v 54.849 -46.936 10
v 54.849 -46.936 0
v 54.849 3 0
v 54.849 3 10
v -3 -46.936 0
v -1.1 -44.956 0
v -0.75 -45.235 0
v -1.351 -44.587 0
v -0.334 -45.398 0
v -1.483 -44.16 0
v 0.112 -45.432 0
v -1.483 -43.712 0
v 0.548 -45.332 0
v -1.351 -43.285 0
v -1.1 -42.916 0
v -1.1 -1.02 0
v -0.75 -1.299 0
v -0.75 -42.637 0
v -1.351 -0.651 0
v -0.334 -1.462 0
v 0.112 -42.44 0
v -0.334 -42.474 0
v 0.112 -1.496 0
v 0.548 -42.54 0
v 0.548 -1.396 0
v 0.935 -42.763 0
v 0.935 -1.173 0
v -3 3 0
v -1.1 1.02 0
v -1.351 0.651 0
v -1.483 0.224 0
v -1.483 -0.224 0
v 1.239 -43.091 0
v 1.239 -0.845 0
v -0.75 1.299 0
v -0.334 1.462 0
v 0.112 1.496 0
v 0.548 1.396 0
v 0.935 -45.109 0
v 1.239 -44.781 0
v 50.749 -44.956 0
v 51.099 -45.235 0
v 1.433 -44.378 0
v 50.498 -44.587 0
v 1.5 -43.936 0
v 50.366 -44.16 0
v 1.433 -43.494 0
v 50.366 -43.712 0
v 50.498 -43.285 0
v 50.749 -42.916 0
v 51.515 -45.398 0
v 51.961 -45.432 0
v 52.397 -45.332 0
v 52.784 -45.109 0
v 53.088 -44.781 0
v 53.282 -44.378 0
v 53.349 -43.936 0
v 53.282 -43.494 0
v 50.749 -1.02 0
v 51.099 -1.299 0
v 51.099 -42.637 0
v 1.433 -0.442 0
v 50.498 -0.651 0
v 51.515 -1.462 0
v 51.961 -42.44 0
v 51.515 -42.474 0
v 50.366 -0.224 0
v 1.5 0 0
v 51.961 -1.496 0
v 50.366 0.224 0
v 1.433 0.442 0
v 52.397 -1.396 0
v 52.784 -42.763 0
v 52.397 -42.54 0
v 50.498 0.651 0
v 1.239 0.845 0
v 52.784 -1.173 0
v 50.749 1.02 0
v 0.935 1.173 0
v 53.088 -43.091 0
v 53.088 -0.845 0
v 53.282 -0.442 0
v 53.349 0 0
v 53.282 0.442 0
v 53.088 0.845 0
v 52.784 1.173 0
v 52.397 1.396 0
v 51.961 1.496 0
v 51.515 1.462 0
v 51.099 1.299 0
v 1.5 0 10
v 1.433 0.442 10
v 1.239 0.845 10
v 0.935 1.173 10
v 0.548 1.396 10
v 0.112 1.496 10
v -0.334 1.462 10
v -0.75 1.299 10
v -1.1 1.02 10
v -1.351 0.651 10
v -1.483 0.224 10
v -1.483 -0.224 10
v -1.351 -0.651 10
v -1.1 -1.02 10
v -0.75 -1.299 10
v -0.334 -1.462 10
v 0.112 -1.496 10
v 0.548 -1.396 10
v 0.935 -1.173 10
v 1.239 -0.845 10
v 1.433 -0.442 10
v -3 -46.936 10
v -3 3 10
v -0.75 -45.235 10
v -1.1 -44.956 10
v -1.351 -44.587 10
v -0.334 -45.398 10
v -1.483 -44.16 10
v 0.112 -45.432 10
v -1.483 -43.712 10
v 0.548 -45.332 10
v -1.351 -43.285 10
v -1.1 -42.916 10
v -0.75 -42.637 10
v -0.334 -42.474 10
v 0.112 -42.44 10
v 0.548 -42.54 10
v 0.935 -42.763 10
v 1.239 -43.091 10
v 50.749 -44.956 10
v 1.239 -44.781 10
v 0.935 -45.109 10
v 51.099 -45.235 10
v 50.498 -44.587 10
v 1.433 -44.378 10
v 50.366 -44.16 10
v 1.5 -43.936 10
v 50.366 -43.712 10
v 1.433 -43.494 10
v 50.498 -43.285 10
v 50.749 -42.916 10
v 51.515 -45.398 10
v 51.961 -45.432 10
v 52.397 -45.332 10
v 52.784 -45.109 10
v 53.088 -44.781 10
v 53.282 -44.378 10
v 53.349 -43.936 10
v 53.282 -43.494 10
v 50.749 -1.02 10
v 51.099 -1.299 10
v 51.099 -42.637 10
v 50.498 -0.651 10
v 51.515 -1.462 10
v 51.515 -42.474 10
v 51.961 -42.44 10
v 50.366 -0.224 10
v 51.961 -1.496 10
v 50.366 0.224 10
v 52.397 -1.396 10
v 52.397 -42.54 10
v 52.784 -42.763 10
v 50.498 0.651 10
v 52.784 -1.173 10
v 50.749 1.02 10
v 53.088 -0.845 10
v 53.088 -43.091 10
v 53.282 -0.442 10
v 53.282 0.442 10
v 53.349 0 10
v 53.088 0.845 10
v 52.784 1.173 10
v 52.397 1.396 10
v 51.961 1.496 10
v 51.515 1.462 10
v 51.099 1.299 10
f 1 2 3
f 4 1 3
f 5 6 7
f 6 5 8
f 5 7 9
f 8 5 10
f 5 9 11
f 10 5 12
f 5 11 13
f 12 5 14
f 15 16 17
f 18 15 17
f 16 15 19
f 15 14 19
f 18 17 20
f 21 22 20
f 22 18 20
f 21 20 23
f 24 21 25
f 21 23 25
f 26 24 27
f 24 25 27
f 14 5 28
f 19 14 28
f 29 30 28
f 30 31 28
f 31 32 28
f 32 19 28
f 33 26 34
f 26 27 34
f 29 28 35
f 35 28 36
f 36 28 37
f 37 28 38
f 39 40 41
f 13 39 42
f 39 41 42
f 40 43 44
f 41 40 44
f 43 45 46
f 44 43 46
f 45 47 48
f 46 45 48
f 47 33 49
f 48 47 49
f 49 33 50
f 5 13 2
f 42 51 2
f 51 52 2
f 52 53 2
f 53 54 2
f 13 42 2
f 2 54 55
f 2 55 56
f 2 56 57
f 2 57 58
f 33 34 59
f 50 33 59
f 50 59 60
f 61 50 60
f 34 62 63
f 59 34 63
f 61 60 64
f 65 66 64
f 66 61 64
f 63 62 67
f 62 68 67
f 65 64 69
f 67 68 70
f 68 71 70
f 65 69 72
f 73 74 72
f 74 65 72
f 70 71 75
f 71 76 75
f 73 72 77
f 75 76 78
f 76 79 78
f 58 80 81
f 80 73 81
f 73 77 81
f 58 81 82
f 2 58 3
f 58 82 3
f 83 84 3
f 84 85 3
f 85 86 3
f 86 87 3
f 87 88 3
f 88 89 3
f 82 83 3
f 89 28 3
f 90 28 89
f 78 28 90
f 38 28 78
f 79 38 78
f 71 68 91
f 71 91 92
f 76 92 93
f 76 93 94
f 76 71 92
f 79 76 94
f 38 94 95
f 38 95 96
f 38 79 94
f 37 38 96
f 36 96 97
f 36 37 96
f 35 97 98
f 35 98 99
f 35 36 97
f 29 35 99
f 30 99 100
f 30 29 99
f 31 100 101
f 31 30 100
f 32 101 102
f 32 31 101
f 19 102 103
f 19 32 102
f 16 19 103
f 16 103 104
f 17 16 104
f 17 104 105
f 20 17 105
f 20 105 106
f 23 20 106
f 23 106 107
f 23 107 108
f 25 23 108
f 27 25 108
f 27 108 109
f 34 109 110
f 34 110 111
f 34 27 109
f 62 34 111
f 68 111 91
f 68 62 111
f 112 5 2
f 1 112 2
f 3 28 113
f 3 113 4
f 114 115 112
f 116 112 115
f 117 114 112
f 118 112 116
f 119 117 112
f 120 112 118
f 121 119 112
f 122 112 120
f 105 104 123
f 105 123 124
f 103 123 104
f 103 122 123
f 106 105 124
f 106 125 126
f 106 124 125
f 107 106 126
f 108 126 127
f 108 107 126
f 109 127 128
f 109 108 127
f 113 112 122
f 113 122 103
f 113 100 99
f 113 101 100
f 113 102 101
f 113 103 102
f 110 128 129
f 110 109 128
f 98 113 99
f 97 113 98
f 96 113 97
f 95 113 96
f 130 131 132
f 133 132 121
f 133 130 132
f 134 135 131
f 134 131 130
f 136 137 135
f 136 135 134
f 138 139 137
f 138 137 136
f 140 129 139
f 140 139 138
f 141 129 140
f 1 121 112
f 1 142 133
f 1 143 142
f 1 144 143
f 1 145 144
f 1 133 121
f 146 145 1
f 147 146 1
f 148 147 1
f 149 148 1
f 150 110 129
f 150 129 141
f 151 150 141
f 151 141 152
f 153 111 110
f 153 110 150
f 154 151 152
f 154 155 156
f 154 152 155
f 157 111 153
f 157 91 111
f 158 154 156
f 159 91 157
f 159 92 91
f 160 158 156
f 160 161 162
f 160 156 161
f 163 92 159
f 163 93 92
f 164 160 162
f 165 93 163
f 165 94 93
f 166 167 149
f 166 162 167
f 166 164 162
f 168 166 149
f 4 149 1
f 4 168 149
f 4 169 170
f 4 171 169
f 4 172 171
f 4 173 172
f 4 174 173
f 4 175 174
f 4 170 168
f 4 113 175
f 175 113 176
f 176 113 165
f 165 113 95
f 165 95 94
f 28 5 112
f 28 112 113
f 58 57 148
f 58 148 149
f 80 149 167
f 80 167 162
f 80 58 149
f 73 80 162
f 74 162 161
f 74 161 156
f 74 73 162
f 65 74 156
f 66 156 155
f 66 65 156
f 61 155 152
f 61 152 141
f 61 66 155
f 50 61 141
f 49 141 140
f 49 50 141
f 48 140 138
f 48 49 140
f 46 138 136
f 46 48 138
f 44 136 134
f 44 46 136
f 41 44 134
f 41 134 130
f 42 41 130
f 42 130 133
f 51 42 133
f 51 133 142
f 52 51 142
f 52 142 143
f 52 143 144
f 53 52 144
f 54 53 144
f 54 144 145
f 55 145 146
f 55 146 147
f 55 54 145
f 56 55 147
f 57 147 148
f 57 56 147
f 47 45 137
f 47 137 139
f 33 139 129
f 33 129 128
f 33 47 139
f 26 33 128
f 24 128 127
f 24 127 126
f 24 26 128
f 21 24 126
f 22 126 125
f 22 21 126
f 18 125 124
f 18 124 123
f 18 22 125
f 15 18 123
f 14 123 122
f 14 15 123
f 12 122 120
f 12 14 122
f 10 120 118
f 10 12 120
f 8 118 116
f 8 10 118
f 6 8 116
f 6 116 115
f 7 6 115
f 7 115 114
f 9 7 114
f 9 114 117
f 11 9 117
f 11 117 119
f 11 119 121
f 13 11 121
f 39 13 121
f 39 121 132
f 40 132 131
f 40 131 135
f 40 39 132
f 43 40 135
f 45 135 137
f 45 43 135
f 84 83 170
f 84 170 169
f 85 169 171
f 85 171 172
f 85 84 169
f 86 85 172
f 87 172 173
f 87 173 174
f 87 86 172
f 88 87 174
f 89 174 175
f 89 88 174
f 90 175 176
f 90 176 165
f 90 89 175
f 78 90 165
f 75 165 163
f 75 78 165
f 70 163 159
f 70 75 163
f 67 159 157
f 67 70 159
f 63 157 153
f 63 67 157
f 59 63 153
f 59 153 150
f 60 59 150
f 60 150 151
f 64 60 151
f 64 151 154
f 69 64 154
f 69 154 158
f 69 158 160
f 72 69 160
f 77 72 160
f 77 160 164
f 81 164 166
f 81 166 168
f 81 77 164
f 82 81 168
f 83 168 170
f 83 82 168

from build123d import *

# Parameters (mm, degrees)
SKETCH_1_W      = 57.849
SKETCH_1_H      = 49.936
SKETCH_1_R      = 1.5
EXTRUDE_1_DEPTH = 10


with BuildPart() as part:
    # 草图1 → 凸台-拉伸1 (new body)
    with BuildSketch(Plane.XY):
        with Locations((25.9245, -21.968)):
            Rectangle(SKETCH_1_W, SKETCH_1_H)
        Circle(SKETCH_1_R, mode=Mode.SUBTRACT)
        with Locations((51.849, 0)):
            Circle(SKETCH_1_R, mode=Mode.SUBTRACT)
        with Locations((51.849, -43.936)):
            Circle(SKETCH_1_R, mode=Mode.SUBTRACT)
        with Locations((0, -43.936)):
            Circle(SKETCH_1_R, mode=Mode.SUBTRACT)
    extrude(amount=EXTRUDE_1_DEPTH)


solid = part.part
